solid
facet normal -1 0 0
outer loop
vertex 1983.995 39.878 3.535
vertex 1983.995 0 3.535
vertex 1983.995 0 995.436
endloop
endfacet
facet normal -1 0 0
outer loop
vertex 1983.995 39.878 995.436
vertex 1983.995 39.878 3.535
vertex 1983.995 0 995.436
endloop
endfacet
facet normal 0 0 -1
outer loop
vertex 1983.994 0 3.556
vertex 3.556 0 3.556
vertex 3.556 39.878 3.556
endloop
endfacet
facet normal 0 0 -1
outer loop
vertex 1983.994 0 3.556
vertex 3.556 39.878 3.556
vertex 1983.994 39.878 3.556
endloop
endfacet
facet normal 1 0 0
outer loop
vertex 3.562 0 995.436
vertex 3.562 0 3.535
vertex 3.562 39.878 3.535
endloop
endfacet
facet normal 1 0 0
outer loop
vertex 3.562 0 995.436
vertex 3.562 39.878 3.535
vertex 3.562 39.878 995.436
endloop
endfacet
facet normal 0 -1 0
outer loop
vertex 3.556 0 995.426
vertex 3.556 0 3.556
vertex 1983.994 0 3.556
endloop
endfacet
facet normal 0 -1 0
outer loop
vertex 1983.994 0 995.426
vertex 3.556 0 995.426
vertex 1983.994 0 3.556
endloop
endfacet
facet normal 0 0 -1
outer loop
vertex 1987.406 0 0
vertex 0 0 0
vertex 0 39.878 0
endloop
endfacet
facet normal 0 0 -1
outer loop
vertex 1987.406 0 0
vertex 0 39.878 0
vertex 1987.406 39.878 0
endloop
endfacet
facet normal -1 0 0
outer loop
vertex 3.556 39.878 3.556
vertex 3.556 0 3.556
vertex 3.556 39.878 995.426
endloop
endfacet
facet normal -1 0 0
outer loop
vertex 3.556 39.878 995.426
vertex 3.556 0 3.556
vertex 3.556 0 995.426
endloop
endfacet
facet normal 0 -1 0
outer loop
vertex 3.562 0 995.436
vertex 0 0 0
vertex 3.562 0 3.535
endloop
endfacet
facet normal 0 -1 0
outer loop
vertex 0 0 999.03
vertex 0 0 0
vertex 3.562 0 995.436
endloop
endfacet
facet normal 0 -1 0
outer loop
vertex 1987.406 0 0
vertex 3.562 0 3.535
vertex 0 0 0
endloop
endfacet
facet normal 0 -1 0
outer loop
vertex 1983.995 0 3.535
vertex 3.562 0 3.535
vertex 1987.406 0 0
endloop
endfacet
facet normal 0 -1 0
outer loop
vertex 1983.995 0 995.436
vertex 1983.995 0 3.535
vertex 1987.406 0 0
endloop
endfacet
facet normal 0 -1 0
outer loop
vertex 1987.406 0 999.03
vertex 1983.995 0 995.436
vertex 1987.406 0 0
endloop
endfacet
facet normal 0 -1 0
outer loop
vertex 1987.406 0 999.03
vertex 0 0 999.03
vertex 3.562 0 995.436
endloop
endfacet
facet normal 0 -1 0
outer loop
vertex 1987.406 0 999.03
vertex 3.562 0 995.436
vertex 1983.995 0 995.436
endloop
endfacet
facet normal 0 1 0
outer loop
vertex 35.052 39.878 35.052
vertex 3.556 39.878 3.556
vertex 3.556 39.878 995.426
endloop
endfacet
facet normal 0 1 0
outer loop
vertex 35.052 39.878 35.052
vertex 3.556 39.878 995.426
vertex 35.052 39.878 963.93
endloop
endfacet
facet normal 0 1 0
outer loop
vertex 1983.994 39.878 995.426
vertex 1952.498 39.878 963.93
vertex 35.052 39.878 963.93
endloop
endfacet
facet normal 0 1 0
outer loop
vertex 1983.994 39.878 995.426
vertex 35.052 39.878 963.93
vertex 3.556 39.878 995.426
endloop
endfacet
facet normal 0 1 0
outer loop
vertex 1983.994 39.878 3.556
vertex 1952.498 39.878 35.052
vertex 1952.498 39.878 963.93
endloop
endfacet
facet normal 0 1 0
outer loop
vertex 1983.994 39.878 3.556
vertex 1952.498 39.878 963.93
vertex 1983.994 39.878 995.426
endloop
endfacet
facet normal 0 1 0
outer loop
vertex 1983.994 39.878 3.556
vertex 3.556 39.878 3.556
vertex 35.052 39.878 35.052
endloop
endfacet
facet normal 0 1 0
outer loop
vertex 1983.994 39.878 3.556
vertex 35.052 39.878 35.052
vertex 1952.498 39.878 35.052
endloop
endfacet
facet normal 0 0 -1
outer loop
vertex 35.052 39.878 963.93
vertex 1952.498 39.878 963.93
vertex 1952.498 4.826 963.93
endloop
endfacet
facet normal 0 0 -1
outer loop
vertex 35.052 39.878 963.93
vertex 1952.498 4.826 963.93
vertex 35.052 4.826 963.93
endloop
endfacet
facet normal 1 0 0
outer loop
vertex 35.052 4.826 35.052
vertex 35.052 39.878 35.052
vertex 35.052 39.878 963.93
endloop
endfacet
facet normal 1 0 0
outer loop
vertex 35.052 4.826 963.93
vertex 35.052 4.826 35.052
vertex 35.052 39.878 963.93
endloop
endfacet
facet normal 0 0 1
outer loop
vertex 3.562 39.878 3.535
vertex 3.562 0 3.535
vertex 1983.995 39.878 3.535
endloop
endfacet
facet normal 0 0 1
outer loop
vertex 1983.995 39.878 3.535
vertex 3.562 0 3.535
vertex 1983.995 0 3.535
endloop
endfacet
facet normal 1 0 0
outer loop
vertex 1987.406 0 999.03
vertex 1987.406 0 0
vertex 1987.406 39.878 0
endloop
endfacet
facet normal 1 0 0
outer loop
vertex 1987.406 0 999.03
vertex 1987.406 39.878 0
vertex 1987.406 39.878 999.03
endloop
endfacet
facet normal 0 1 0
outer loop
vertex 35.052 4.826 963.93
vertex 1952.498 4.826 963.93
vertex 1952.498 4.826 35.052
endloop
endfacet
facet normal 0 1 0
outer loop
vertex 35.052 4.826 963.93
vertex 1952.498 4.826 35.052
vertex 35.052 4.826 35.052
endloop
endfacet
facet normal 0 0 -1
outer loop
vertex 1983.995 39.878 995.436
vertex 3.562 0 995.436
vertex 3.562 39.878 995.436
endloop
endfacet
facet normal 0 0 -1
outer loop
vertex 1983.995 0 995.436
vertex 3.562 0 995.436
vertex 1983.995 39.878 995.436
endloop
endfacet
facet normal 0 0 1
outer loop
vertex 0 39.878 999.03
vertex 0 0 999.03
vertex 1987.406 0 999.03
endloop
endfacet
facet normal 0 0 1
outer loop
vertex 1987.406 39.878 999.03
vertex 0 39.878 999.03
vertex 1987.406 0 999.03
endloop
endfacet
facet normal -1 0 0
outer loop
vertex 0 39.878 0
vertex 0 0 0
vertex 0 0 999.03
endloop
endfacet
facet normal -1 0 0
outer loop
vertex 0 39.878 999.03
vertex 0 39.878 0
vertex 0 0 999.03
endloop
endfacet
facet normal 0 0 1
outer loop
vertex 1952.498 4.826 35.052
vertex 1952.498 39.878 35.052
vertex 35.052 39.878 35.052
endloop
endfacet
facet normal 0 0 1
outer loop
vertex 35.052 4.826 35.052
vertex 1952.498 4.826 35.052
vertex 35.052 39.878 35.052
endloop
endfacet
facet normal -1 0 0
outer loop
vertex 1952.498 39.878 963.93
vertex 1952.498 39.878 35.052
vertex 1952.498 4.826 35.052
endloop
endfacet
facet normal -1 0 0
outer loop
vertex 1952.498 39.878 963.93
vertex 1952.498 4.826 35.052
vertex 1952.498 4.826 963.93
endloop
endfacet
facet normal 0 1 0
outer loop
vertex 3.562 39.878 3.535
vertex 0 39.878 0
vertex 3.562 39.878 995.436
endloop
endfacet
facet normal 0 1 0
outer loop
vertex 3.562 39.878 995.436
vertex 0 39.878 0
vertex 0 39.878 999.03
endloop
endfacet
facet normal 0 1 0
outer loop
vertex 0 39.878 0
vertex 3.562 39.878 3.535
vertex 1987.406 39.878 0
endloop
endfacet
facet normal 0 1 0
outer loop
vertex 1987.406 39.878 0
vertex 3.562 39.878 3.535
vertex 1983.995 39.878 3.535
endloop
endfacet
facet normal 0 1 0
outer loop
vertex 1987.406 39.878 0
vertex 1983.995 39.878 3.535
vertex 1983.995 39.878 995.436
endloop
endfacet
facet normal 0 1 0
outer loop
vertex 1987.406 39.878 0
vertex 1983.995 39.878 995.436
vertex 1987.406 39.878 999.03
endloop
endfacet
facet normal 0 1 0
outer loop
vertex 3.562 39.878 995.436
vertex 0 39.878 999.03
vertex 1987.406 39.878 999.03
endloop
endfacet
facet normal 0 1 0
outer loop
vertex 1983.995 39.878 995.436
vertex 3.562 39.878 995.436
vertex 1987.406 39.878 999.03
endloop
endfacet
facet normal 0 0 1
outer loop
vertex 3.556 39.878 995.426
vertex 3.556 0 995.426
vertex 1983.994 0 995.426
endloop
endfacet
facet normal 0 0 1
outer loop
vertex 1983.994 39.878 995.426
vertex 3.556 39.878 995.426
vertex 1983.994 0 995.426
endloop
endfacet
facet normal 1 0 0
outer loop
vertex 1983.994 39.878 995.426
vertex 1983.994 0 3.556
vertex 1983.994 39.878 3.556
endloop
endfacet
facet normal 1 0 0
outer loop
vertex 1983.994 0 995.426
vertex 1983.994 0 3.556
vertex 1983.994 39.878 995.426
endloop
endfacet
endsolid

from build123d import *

# Parameters (mm, degrees)
F0_W     = 1987.55
F0_H     = 39.878
F1_DEPTH = 998.982
F2_W     = 1917.446
F2_H     = 928.878
F3_DEPTH = 35.052
F4_W     = 1987.55
F4_H     = 998.982
F4_W_2   = 1980.438
F4_H_2   = 991.87
F5_DEPTH = 39.878
F6_W     = 1987.406373
F6_H     = 999.029934
F6_W_2   = 1980.433064
F6_H_2   = 991.901092
F7_DEPTH = 39.878


with BuildPart() as f1:
    # F0 (on Top) → F1 (new body)
    with BuildSketch(Plane.XY):
        with Locations((993.775, 19.939)):
            Rectangle(F0_W, F0_H)
    extrude(amount=F1_DEPTH)

    # F2 (on face) → F3 (cut)
    with BuildSketch(Plane(origin=(0, 39.878, 0), x_dir=(-1, 0, 0), z_dir=(0, 1, 0))):
        with Locations((-993.775, 499.491)):
            Rectangle(F2_W, F2_H)
    extrude(amount=-F3_DEPTH, mode=Mode.SUBTRACT)

    # F4 (on face) → F5 (cut)
    with BuildSketch(Plane.XZ):
        with Locations((993.775, 499.491)):
            Rectangle(F4_W, F4_H)
        with Locations((993.775, 499.491)):
            Rectangle(F4_W_2, F4_H_2, mode=Mode.SUBTRACT)
    extrude(amount=-F5_DEPTH, mode=Mode.SUBTRACT)


with BuildPart() as f7:
    # F6 (on face) → F7 (new body)
    with BuildSketch(Plane.XZ):
        with Locations((993.703186, 499.514967)):
            Rectangle(F6_W, F6_H)
        with Locations((993.77831, 499.48505)):
            Rectangle(F6_W_2, F6_H_2, mode=Mode.SUBTRACT)
    extrude(amount=-F7_DEPTH)


solid = Compound([f1.part, f7.part])
